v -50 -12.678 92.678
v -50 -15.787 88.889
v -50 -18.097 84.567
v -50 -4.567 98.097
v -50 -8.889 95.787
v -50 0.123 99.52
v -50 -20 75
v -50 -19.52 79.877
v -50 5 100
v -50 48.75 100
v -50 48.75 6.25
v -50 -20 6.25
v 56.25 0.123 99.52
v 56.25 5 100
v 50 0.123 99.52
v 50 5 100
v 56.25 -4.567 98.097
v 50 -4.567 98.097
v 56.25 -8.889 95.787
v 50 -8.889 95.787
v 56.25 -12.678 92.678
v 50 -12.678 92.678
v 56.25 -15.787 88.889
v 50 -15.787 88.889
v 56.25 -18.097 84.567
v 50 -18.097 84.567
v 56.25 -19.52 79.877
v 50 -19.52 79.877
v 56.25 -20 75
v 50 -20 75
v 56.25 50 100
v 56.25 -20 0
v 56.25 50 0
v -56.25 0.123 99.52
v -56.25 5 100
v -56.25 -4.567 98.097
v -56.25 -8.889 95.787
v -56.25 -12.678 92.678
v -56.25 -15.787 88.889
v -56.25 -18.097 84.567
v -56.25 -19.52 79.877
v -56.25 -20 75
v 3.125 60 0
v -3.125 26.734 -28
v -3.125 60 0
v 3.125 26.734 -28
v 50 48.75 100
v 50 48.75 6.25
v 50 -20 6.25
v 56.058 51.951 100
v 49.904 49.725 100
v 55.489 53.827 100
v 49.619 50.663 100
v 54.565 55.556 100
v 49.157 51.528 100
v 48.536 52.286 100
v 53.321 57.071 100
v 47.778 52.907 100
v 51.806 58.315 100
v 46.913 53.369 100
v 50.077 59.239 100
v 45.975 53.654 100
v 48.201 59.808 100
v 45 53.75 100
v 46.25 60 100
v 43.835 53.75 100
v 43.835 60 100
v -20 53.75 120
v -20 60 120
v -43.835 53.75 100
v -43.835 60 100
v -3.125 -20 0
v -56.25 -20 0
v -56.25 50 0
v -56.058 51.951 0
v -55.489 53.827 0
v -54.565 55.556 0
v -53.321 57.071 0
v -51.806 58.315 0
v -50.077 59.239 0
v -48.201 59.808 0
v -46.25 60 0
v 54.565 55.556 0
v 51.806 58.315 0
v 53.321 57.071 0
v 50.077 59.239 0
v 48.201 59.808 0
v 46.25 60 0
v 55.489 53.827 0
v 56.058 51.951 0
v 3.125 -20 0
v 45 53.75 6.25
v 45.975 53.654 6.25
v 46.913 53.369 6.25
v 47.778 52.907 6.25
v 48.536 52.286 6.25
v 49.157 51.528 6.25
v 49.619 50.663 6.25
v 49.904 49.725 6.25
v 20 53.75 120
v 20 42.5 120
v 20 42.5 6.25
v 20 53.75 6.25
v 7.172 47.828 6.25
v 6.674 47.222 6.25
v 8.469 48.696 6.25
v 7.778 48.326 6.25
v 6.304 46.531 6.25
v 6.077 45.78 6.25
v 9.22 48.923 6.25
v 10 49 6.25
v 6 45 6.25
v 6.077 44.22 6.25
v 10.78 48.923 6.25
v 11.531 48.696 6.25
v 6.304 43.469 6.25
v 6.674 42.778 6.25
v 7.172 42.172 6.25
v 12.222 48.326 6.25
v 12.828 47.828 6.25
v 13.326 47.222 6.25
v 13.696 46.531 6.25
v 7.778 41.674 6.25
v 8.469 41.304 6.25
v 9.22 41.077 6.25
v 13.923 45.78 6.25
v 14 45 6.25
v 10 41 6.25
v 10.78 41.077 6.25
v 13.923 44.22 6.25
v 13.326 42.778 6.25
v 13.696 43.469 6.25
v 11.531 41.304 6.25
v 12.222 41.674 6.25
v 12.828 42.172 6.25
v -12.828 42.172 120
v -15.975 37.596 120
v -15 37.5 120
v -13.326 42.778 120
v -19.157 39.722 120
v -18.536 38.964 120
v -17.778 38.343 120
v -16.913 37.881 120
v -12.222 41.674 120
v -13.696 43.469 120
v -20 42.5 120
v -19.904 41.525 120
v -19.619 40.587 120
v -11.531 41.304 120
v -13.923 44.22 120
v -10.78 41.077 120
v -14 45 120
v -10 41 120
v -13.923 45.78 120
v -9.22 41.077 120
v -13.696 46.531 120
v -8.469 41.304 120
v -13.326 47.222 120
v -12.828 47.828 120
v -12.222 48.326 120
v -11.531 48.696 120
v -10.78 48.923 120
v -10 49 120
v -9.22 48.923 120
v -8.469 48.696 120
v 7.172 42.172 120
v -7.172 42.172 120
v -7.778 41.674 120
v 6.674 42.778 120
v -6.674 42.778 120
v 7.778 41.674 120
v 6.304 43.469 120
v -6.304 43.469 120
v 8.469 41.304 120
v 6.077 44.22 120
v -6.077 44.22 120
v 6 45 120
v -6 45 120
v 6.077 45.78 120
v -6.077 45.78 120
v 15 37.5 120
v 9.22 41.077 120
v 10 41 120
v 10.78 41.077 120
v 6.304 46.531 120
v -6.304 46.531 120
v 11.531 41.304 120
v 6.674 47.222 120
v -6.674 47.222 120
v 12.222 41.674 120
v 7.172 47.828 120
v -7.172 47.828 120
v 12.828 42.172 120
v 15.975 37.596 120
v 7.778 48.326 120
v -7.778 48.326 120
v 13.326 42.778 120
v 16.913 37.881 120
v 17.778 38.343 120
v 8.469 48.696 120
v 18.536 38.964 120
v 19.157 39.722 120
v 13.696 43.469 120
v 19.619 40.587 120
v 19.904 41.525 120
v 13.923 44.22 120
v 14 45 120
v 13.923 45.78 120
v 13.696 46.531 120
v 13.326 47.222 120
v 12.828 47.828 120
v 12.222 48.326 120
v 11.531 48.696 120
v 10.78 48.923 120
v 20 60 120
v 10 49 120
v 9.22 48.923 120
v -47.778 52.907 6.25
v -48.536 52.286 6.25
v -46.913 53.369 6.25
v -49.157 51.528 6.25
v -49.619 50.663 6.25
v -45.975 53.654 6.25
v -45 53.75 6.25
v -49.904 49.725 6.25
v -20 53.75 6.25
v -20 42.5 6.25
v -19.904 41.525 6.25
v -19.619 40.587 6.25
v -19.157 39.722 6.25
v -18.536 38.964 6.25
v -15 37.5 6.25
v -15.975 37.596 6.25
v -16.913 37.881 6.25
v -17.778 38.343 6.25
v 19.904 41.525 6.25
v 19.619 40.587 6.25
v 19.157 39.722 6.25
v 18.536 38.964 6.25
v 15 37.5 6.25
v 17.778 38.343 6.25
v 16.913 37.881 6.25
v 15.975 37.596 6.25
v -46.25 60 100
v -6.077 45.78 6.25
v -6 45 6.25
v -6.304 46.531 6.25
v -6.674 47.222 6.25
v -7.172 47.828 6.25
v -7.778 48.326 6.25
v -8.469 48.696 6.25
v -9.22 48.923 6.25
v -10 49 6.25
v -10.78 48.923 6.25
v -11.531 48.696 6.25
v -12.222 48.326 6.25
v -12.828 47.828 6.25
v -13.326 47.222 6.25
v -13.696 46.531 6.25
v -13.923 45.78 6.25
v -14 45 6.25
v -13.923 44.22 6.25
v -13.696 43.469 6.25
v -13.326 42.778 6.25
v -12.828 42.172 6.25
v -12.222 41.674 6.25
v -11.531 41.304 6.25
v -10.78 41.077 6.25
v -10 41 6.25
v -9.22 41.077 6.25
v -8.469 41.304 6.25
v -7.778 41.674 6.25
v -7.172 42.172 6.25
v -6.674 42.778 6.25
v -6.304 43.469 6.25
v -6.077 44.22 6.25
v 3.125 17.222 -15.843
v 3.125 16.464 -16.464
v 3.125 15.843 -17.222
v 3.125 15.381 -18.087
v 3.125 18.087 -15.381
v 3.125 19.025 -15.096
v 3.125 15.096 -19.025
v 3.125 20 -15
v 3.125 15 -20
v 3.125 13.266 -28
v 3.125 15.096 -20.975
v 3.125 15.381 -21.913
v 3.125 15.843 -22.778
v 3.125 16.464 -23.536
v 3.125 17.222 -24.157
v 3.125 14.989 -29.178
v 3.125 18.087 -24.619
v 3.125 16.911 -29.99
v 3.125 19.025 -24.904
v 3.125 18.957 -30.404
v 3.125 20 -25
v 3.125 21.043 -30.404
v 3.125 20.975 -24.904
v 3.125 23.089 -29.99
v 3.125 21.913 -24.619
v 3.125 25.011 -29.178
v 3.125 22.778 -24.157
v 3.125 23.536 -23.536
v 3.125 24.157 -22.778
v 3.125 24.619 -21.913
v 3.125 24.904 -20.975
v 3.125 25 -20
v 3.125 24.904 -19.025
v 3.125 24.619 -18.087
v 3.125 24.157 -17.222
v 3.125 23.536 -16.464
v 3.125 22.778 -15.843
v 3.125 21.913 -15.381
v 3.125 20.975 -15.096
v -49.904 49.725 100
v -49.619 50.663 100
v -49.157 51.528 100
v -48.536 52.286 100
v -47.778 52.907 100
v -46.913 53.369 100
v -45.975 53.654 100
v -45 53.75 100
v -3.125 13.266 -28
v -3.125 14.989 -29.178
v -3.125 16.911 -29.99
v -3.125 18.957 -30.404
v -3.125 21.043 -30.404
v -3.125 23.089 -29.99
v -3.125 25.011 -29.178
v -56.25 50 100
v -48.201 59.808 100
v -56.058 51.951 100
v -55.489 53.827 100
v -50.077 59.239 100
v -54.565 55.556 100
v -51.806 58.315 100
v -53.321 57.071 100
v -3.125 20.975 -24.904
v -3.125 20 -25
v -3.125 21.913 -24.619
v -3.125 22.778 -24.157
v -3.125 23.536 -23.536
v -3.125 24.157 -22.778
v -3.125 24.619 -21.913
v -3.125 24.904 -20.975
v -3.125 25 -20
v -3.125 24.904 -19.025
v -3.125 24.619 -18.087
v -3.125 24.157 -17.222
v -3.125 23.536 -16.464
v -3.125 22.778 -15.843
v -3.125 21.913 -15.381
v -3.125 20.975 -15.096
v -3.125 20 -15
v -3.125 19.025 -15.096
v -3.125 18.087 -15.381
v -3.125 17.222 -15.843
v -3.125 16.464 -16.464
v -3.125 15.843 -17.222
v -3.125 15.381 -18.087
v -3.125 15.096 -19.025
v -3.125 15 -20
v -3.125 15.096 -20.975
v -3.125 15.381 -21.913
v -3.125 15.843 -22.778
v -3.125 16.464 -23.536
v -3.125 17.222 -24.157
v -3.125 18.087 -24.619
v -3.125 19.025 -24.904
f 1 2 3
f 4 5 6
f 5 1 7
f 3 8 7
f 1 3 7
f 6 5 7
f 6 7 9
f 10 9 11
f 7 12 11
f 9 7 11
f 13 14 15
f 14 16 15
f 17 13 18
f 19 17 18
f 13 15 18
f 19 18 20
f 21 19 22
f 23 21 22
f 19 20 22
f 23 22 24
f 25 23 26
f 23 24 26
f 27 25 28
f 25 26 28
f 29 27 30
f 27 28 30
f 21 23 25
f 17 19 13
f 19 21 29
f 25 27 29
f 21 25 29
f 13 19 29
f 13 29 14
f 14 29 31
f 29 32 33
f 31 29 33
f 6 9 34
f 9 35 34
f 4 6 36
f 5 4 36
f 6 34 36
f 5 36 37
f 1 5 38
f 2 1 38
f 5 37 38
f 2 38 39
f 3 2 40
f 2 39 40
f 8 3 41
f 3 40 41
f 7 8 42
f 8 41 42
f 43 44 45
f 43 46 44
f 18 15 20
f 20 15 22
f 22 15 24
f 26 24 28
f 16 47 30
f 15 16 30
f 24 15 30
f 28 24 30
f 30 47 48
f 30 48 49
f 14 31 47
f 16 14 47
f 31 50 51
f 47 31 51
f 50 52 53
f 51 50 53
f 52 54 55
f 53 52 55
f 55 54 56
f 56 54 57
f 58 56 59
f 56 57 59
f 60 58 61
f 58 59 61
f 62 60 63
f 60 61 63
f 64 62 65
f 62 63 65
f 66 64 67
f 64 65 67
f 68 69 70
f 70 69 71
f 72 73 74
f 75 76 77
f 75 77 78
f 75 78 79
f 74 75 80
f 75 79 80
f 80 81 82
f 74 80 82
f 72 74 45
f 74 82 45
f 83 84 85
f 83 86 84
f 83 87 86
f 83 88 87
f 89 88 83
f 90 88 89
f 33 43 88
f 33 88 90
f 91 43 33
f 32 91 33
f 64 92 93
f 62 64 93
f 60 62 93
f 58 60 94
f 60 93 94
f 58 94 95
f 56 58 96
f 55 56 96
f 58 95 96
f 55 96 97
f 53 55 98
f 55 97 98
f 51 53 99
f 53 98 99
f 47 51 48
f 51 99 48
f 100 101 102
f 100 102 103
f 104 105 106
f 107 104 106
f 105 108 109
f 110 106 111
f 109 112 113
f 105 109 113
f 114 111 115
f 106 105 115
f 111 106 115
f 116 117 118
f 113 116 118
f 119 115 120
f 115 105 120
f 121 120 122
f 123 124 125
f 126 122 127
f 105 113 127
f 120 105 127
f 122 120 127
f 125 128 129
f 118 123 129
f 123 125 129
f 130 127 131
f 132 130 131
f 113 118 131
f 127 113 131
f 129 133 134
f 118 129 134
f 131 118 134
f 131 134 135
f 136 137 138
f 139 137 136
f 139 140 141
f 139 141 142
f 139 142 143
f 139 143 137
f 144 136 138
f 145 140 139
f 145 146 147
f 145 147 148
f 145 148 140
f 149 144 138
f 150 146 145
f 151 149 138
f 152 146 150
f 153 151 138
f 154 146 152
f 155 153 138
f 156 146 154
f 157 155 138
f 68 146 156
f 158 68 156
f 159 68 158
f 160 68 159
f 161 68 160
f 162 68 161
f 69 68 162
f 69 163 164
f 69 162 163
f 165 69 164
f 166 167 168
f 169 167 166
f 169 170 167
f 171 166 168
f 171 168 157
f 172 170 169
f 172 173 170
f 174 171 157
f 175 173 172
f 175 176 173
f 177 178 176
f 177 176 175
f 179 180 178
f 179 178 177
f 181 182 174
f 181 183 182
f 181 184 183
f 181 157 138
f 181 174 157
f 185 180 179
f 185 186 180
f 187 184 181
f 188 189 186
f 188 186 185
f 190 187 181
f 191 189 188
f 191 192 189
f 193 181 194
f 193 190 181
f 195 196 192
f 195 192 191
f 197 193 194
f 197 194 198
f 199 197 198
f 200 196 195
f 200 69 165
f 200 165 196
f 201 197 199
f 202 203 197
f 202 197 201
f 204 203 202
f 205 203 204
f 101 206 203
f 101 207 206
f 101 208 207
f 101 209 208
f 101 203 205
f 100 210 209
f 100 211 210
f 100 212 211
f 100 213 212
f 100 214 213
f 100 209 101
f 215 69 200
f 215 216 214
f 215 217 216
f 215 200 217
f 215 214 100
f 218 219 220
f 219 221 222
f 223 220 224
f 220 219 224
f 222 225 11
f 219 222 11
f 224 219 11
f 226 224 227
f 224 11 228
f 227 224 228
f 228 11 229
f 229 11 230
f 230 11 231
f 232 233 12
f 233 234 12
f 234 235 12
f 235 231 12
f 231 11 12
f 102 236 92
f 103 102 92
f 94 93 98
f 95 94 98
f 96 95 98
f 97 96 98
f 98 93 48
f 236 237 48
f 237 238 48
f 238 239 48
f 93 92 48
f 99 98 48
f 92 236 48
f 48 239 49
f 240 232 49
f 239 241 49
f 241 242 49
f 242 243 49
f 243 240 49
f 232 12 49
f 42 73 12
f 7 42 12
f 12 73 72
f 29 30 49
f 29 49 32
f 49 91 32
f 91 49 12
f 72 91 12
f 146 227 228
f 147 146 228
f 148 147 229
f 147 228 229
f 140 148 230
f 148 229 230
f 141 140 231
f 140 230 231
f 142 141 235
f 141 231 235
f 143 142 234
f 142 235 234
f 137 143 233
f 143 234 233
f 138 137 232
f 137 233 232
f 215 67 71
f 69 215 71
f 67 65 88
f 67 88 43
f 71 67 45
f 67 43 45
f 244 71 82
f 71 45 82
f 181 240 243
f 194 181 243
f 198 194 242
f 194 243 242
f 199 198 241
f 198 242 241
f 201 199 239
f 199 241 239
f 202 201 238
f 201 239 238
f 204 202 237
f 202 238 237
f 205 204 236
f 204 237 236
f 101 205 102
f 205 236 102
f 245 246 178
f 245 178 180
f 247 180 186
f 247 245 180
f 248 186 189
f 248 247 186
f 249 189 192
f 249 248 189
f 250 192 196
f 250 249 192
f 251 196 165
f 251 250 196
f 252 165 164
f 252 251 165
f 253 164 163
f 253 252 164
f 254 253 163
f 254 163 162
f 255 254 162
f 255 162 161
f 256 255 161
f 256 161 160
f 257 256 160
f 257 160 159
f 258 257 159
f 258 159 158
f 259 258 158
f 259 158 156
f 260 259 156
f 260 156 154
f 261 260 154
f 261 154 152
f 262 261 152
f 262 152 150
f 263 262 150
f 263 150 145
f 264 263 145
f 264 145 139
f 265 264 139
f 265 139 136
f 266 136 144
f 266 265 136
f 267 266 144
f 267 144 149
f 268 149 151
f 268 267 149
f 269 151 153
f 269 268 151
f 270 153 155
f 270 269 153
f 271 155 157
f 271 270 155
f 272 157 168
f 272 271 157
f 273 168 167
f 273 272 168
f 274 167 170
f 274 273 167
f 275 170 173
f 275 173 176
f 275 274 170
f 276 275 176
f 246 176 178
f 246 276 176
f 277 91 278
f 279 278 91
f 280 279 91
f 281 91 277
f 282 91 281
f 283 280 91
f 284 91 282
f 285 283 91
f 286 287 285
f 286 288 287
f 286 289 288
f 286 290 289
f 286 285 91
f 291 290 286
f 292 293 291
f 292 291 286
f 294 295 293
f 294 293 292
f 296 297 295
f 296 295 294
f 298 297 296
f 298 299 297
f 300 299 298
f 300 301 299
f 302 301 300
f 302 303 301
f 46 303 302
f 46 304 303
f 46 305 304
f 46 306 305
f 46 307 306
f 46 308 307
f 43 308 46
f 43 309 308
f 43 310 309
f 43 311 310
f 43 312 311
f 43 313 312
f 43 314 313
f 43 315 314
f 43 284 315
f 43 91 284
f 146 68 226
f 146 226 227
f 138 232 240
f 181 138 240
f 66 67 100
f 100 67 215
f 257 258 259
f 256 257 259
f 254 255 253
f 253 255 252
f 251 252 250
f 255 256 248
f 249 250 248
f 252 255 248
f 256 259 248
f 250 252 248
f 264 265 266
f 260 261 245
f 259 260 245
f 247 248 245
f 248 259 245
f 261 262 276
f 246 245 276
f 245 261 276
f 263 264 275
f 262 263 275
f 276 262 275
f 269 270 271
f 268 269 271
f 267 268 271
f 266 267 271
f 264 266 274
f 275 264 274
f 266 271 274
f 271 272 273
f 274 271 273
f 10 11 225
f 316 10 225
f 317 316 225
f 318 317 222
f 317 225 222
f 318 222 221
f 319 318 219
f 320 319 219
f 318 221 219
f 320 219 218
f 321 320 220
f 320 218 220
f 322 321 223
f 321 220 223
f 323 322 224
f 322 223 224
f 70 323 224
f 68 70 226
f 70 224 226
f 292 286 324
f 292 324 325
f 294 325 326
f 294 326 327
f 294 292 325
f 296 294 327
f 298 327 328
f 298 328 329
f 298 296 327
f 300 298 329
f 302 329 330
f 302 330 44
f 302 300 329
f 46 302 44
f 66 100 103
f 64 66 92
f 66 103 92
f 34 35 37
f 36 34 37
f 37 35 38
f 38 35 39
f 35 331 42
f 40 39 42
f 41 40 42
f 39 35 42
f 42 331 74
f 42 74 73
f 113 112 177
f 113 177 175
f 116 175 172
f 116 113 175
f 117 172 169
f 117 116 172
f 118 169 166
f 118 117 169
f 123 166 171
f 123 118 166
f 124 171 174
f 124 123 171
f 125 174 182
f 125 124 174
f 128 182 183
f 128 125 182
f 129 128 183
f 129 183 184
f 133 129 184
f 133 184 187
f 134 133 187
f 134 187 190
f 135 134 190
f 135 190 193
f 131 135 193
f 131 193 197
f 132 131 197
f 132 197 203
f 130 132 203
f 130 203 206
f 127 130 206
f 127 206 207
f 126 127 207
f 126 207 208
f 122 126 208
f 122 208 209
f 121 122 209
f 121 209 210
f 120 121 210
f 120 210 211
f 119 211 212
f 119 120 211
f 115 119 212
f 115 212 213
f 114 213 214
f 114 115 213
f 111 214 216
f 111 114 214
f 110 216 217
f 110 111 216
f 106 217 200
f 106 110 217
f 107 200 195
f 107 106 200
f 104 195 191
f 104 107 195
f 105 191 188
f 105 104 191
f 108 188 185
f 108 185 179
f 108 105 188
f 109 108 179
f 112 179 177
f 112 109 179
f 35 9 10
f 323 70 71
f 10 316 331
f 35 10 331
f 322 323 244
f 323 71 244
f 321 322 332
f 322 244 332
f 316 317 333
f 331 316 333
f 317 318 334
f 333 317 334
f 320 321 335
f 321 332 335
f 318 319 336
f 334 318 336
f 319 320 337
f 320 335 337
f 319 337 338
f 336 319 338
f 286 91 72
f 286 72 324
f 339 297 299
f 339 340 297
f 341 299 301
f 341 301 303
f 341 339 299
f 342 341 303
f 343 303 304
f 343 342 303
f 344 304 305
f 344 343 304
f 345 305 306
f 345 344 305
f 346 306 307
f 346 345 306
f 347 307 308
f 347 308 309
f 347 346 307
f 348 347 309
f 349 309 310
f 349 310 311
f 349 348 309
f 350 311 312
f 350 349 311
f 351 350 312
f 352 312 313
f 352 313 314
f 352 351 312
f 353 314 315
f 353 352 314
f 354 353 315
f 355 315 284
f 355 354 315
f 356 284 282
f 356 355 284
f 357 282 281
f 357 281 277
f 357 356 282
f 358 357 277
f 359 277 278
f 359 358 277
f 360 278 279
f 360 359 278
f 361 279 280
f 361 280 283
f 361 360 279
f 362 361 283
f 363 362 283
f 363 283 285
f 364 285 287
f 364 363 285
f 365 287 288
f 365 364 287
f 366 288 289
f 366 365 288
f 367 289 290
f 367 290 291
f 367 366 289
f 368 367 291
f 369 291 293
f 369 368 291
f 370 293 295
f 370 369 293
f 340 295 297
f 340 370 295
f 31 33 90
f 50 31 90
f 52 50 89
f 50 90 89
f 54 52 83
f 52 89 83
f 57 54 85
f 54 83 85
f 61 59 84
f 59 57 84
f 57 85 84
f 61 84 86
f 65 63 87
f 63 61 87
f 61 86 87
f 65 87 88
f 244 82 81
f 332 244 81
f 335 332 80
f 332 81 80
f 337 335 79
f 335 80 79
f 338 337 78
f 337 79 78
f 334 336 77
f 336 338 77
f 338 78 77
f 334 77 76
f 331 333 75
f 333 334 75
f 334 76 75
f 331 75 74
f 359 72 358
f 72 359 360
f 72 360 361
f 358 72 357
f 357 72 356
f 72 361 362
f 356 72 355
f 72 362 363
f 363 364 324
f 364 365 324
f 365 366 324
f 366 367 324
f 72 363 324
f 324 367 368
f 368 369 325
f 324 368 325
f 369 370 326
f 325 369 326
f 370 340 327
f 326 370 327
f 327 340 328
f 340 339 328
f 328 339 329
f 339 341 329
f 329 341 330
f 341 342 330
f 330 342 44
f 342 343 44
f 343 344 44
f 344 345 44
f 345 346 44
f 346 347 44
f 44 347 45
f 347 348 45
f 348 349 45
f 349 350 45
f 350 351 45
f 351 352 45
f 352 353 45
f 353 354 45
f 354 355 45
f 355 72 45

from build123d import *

# Parameters (mm, degrees)
SKETCH1_R           = 4
BOSS_EXTRUDE1_DEPTH = 120
CUT_EXTRUDE2_DEPTH  = 169.5
SKETCH4_R           = 5
BOSS_EXTRUDE3_DEPTH = 3.125
BOSS_EXTRUDE5_REACH = 156.803
SKETCH6_W           = 106.515256917
SKETCH6_H           = 6.25
FILLET1_R           = 25


with BuildPart() as part:
    # Sketch1 → Boss-Extrude1 (new body)
    with BuildSketch(Plane.XY):
        with BuildLine():
            Line((-45, 53.75), (-20, 53.75))
            Line((-20, 53.75), (-20, 42.5))
            ThreePointArc((-20, 42.5), (-18.535533906, 38.964466094), (-15, 37.5))
            Line((-15, 37.5), (15, 37.5))
            ThreePointArc((15, 37.5), (18.535533906, 38.964466094), (20, 42.5))
            Line((20, 42.5), (20, 53.75))
            Line((20, 53.75), (45, 53.75))
            ThreePointArc((45, 53.75), (48.535533906, 52.285533906), (50, 48.75))
            Line((50, 48.75), (50, -20))
            Line((50, -20), (56.25, -20))
            Line((56.25, -20), (56.25, 50))
            ThreePointArc((56.25, 50), (53.321067812, 57.071067812), (46.25, 60))
            Line((46.25, 60), (-46.25, 60))
            ThreePointArc((-46.25, 60), (-53.321067812, 57.071067812), (-56.25, 50))
            Line((-56.25, 50), (-56.25, -20))
            Line((-56.25, -20), (-50, -20))
            Line((-50, -20), (-50, 48.75))
            ThreePointArc((-50, 48.75), (-48.535533906, 52.285533906), (-45, 53.75))
        make_face()
        with Locations((-10, 45)):
            Circle(SKETCH1_R, mode=Mode.SUBTRACT)
        with Locations(Location((10, 45, 0), (0, 0, 180))):
            Circle(SKETCH1_R, mode=Mode.SUBTRACT)
    extrude(amount=BOSS_EXTRUDE1_DEPTH)

    # Sketch2 → Cut-Extrude2 (cut, symmetric)
    with BuildSketch(Plane(origin=(0, 0, 0), x_dir=(1, 0, 0), z_dir=(0, 1, 0))):
        Polygon((-20, -120), (-43.835071852, -100), (-56.25, -100), (-56.25, -170), (56.25, -170), (56.25, -100), (43.835071852, -100), (20, -120), align=None)
    extrude(amount=CUT_EXTRUDE2_DEPTH, both=True, mode=Mode.SUBTRACT)

    # Sketch4 → Boss-Extrude3 (add, symmetric)
    with BuildSketch(Plane(origin=(0, 0, 0), x_dir=(0, 0, -1), z_dir=(1, 0, 0))):
        with BuildLine():
            Line((0, 60), (0, -20))
            Line((0, -20), (28, 13.266499161))
            ThreePointArc((28, 13.266499161), (30.456578482, 20), (28, 26.733500839))
            Line((28, 26.733500839), (0, 60))
        make_face()
        with Locations((20, 20)):
            Circle(SKETCH4_R, mode=Mode.SUBTRACT)
    extrude(amount=BOSS_EXTRUDE3_DEPTH, both=True)

    # Boss-Extrude5: up to this face of the body (flat: up to its plane)
    boss_extrude5_end = Plane(part.part.faces().sort_by_distance((-32.103527113, 53.75, 54.932363347))[0])
    # Sketch6 → Boss-Extrude5 (add, up to the picked face)
    with BuildSketch(Plane.XZ.offset(20), mode=Mode.PRIVATE) as boss_extrude5_sk1:
        with Locations((-0.086289354, 3.125)):
            Rectangle(SKETCH6_W, SKETCH6_H)
    boss_extrude5_tool1 = split(extrude(boss_extrude5_sk1.sketch, amount=-BOSS_EXTRUDE5_REACH, mode=Mode.PRIVATE), bisect_by=boss_extrude5_end, keep=Keep.BOTH, mode=Mode.PRIVATE)
    add(boss_extrude5_tool1.solids().sort_by(Axis((-0.086289, -20, 3.125), (0, 1, 0)))[0])

    # Fillet1
    fillet1_edges = [part.edges().sort_by_distance(p)[0] for p in [
        (53.125, -20, 100),
        (-53.125, -20, 100),
    ]]
    fillet(fillet1_edges, radius=FILLET1_R)


solid = part.part
